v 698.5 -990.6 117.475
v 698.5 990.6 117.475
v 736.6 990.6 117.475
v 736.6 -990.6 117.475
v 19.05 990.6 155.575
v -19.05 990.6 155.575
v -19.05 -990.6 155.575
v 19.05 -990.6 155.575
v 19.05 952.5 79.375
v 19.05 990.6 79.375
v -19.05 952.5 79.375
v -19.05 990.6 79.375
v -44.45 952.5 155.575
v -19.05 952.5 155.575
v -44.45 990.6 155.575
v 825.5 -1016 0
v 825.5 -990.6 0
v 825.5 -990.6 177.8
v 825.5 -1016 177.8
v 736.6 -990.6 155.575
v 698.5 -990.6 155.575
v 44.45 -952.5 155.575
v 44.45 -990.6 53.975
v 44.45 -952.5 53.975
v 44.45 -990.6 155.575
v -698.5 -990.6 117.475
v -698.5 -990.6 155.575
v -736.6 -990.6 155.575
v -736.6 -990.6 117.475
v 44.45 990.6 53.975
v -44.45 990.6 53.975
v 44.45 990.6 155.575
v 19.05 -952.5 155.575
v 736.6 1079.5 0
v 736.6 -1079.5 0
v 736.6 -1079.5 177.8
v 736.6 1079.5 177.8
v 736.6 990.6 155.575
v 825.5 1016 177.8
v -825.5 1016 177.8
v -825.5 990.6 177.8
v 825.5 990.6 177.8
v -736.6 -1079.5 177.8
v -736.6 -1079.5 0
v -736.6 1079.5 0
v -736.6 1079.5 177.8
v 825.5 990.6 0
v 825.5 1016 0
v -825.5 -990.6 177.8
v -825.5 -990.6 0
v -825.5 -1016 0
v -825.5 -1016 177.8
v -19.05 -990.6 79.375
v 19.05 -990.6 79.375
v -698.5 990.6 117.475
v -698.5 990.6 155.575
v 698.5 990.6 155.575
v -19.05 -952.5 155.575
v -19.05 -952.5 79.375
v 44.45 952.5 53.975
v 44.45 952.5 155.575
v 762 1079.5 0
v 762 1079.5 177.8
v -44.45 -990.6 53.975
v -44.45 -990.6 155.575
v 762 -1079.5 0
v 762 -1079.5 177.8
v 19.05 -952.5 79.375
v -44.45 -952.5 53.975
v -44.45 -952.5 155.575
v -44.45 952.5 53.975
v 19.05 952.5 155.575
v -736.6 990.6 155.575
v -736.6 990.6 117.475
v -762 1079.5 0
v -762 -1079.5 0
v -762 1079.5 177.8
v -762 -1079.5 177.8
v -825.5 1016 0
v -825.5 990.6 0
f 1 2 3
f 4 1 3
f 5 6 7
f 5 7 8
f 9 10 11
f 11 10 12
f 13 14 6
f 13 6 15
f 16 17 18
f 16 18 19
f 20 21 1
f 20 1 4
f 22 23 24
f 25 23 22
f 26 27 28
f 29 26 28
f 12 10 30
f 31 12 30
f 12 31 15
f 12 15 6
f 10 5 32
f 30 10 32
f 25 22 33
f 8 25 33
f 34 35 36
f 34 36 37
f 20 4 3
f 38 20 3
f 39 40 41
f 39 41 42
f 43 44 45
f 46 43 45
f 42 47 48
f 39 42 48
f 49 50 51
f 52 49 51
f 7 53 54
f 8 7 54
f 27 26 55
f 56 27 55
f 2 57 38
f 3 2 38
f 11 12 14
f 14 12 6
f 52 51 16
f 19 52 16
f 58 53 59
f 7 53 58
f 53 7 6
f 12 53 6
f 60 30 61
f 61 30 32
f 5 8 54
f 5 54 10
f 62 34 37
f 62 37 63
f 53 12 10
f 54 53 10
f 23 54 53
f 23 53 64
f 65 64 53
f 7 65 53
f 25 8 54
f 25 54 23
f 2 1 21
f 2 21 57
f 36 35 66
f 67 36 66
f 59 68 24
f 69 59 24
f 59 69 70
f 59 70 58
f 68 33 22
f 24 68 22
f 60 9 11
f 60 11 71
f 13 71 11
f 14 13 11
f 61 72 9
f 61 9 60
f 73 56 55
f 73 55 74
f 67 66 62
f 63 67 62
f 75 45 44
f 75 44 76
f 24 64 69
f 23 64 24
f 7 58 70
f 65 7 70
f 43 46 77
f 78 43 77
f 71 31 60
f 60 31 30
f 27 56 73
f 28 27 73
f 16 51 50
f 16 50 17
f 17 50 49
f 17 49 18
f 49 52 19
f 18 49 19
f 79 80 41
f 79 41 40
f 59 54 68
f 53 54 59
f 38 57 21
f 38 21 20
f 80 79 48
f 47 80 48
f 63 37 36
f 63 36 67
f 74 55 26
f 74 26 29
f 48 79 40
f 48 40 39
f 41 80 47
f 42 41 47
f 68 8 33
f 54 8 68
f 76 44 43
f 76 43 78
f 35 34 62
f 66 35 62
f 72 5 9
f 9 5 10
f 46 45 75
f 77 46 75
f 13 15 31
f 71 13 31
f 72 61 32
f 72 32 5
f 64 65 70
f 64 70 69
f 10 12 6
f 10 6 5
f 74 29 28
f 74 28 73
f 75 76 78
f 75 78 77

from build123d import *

# Parameters (mm, degrees)
F2_W      = 1651
F2_H      = 25.4
F3_DEPTH  = 177.8
F4_W      = 25.4
F4_H      = 2159
F5_DEPTH  = 177.8
F7_W      = 38.1
F7_H      = 1981.2
F8_DEPTH  = 38.1
F11_W     = 38.1
F11_H     = 1981.2
F12_DEPTH = 38.1
F14_DEPTH = 38.1


with BuildPart() as f3:
    # F2 (on Top) → F3 (new body)
    with BuildSketch(Plane.XY):
        with Locations((0, 1003.3)):
            Rectangle(F2_W, F2_H)
    extrude(amount=F3_DEPTH)


with BuildPart() as f5:
    # F4 (on Top) → F5 (new body)
    with BuildSketch(Plane.XY):
        with Locations((749.3, 0)):
            Rectangle(F4_W, F4_H)
    extrude(amount=F5_DEPTH)


with BuildPart() as f8:
    # F7 (on offset) → F8 (new body)
    with BuildSketch(Plane.XY.offset(117.475)):
        with Locations((717.55, 0)):
            Rectangle(F7_W, F7_H)
    extrude(amount=F8_DEPTH)


with BuildPart() as f9_1:
    # F9: instance of F3
    add(f3.part.mirror(Plane.XZ))


with BuildPart() as f10_1:
    # F10: instance of F5
    add(f5.part.mirror(Plane.YZ))


with BuildPart() as f10_2:
    # F10: instance of F8
    add(f8.part.mirror(Plane.YZ))


with BuildPart() as f12:
    # F11 (on offset) → F12 (new body, symmetric)
    with BuildSketch(Plane.XY.offset(117.475)):
        Rectangle(F11_W, F11_H)
    extrude(amount=F12_DEPTH, both=True)


with BuildPart() as f14:
    # F13 (on face) → F14 (new body)
    with BuildSketch(Plane.XZ.offset(-990.6)):
        Polygon((19.05, 155.575), (19.05, 79.375), (-19.05, 79.375), (-19.05, 155.575), (-44.45, 155.575), (-44.45, 53.975), (44.45, 53.975), (44.45, 155.575), align=None)
    extrude(amount=F14_DEPTH)


with BuildPart() as f15_1:
    # F15: instance of F14
    add(f14.part.mirror(Plane.XZ))


solid = Compound([f3.part, f5.part, f8.part, f9_1.part, f10_1.part, f10_2.part, f12.part, f14.part, f15_1.part])
